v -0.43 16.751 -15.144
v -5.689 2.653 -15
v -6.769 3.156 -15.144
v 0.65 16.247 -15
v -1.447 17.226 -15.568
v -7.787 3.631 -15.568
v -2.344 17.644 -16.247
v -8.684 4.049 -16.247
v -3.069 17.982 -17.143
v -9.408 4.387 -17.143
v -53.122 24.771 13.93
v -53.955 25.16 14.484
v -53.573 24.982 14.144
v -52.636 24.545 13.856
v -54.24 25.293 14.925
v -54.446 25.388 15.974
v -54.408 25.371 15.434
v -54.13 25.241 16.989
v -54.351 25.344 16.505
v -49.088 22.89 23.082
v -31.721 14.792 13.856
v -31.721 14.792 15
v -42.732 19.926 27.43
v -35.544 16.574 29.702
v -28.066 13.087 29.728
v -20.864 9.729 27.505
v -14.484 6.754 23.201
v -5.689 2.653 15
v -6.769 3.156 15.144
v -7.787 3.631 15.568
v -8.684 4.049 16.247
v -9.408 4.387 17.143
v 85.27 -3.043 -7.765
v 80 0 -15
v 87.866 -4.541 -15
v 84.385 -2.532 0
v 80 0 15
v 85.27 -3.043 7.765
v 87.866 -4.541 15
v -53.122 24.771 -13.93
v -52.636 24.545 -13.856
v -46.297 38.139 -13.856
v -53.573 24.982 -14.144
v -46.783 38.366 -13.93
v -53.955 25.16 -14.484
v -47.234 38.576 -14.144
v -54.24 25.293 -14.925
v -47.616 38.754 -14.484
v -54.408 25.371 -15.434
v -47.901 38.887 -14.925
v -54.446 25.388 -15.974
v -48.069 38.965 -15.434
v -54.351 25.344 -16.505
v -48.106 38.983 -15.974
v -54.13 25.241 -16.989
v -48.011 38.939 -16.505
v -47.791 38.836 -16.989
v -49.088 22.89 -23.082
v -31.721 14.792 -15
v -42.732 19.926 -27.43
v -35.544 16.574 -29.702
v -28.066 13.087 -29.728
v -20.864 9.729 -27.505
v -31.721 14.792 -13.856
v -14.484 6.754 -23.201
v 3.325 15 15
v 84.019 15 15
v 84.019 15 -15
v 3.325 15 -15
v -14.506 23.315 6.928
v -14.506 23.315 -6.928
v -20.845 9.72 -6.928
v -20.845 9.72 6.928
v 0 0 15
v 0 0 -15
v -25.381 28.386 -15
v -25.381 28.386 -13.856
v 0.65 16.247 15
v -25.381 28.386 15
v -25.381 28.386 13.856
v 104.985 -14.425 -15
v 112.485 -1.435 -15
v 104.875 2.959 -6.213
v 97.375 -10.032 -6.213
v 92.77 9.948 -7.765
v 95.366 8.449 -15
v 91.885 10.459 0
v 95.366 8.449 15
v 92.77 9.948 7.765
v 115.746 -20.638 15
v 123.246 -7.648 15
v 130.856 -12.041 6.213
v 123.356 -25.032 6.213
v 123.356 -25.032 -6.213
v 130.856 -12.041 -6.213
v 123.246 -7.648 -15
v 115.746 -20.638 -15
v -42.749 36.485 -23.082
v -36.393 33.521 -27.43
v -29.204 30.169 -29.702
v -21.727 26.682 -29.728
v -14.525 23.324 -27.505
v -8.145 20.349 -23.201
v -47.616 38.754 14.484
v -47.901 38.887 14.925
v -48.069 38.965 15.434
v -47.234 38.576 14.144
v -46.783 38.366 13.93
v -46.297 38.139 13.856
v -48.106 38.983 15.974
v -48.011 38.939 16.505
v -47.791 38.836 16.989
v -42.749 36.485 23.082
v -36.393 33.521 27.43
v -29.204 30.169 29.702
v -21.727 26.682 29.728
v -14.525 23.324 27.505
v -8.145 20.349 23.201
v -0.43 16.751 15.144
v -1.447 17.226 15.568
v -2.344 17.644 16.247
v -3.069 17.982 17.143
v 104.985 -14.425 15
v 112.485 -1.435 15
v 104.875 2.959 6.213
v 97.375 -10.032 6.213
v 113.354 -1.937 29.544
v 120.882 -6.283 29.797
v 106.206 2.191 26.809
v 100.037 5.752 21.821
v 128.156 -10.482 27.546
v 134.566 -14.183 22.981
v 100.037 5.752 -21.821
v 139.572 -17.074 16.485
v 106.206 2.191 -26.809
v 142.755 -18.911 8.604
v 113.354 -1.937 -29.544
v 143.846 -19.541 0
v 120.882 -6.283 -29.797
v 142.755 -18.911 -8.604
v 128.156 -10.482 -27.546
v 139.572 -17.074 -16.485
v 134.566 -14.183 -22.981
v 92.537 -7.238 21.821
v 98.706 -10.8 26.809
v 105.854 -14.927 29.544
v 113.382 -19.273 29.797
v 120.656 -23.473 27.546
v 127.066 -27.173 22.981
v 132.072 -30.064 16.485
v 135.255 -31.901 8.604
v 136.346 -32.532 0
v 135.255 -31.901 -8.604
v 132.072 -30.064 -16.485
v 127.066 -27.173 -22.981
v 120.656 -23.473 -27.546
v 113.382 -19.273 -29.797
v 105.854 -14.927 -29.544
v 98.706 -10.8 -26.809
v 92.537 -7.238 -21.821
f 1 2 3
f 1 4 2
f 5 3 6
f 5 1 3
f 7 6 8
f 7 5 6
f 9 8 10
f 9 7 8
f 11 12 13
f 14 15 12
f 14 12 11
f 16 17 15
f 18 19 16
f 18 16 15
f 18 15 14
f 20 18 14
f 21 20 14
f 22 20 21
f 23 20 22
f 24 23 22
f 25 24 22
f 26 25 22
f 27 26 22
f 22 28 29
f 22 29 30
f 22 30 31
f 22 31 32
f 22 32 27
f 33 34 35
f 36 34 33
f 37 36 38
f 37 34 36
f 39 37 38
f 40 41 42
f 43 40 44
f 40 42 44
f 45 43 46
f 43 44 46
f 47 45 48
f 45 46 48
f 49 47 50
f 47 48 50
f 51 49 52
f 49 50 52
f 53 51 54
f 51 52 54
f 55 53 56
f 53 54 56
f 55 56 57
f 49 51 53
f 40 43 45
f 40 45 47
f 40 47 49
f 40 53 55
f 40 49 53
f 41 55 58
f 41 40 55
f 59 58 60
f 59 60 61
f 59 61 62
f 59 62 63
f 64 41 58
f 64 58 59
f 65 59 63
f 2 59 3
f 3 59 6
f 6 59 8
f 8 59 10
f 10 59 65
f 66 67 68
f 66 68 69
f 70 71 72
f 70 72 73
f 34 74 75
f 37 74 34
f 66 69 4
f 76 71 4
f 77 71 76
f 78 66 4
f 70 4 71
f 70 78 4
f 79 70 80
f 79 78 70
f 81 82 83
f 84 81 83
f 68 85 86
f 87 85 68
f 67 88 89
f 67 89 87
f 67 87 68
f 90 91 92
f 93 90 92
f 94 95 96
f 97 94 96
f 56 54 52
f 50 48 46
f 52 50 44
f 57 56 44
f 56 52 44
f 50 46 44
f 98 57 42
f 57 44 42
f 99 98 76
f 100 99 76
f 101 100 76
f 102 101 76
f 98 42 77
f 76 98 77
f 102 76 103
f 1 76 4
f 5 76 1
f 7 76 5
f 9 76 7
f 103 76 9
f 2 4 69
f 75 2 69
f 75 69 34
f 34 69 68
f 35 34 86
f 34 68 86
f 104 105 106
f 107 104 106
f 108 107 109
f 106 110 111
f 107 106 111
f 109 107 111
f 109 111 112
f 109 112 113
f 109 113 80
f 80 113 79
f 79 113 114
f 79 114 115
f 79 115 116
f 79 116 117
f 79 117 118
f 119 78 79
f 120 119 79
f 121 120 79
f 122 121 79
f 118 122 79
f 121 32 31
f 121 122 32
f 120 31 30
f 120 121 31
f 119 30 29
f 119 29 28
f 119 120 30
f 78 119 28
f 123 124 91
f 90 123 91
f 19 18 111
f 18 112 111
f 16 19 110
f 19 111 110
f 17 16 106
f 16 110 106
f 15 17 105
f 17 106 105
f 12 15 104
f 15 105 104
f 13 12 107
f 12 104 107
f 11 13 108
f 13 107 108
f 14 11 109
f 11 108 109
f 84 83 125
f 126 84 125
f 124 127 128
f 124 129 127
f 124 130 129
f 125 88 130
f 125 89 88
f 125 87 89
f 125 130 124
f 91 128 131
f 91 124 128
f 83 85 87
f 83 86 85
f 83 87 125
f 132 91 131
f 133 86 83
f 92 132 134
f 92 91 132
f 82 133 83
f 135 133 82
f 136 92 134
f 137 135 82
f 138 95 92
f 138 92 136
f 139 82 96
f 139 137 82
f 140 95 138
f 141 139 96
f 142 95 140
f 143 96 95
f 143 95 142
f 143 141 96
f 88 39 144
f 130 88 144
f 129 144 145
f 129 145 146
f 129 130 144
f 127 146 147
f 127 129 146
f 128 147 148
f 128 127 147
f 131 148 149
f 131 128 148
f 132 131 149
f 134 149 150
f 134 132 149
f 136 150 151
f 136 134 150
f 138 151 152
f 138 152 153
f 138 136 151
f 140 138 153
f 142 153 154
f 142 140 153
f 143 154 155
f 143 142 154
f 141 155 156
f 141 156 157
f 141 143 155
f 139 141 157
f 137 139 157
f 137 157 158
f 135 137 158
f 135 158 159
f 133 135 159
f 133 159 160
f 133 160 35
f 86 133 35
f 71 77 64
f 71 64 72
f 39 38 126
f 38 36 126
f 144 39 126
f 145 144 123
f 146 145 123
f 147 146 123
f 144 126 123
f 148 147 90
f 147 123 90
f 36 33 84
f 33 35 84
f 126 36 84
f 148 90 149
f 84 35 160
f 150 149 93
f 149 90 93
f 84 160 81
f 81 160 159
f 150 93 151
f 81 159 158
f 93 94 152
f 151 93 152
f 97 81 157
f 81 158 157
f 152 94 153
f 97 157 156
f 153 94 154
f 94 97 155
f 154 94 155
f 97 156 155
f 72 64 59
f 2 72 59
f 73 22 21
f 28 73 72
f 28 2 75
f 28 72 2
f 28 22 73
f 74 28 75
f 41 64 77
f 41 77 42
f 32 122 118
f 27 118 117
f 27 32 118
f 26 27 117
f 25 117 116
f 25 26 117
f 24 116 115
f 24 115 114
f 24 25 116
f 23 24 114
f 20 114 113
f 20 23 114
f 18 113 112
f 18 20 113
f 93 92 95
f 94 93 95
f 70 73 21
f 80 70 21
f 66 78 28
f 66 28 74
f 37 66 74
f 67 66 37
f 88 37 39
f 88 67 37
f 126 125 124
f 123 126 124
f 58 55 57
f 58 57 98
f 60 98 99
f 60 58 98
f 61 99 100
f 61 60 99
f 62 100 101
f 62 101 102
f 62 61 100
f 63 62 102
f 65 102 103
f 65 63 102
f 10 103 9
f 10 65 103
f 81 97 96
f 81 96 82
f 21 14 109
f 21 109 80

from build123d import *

# Parameters (mm, degrees)
EXTRUDE_1_DEPTH          = 15
CUT_EXTRUDE_1_DEPTH      = 109.392019307
CUT_EXTRUDE_1_DEPTH_BACK = 109.392019307
SKETCH_3_R               = 30
SKETCH_3_3_R             = 30
EXTRUDE_2_DEPTH          = 15
EXTRUDE_3_DEPTH          = 15
CUT_EXTRUDE_2_DEPTH      = 153.192153917
CUT_EXTRUDE_2_DEPTH_BACK = 153.192153917
FILLET_1_R               = 5
FILLET_2_R               = 2


with BuildPart() as part:
    # 草图1 → 凸台-拉伸1 (new, symmetric)
    with BuildSketch(Plane.XY):
        Polygon((0, 0), (80, 0), (106.830127019, -15.490381057), (114.330127019, -2.5), (84.019237886, 15), (3.32541994, 15), (-25.38149862, 28.386255966), (-31.720772546, 14.791639161), align=None)
    extrude(amount=EXTRUDE_1_DEPTH, both=True)

    # 草图3 → 切除-拉伸1 (cut, two sides: drawn at the far end of the back side and taken through both)
    with BuildSketch(Plane(origin=(27.5, 47.631397208, 0), x_dir=(0.866025403784438, -0.5000000000000012, 0), z_dir=(0.5000000000000012, 0.866025403784438, 0)).offset(-CUT_EXTRUDE_1_DEPTH_BACK)):
        with Locations((104.345320277, 0)):
            Circle(SKETCH_3_R)
        Polygon((119.345320277, -6.213203436), (119.345320277, 6.213203436), (110.558523712, 15), (98.132116841, 15), (89.345320277, 6.213203436), (89.345320277, -6.213203436), (98.132116841, -15), (110.558523712, -15), align=None, mode=Mode.SUBTRACT)
    extrude(amount=CUT_EXTRUDE_1_DEPTH + CUT_EXTRUDE_1_DEPTH_BACK, mode=Mode.SUBTRACT)


with BuildPart() as body_2:
    # of the pieces the cut leaves, the one that is kept (cut_extrude_1_keep)
    add(part.part.solids().sort_by_distance((0, 0, -15))[0])

    # 草图3<3> → 凸台-拉伸2 (add)
    with BuildSketch(Plane(origin=(27.5, 47.631397208, 0), x_dir=(0.866025403784438, -0.5000000000000012, 0), z_dir=(0.5000000000000012, 0.866025403784438, 0))):
        with Locations((104.345320277, 0)):
            Circle(SKETCH_3_3_R)
        Polygon((119.345320277, -6.213203436), (119.345320277, 6.213203436), (110.558523712, 15), (98.132116841, 15), (89.345320277, 6.213203436), (89.345320277, -6.213203436), (98.132116841, -15), (110.558523712, -15), align=None, mode=Mode.SUBTRACT)
    extrude(amount=-EXTRUDE_2_DEPTH)

    # 草图6 → 凸台-拉伸3 (add)
    with BuildSketch(Plane(origin=(0, 0, 0), x_dir=(0.9063077870366528, -0.4226182617406936, 0), z_dir=(-0.4226182617406936, -0.9063077870366528, 0))):
        with BuildLine():
            Line((-61.608269391, 13.856406461), (-35, 13.856406461))
            Line((-35, 13.856406461), (-35, 15))
            Line((-35, 15), (-9.019237886, 15))
            ThreePointArc((-9.019237886, 15), (-35.652221505, 29.99290928), (-61.608269391, 13.856406461))
        make_face()
        with BuildLine():
            Line((-35, 15), (-35, 13.856406461))
            Line((-35, 13.856406461), (-23, 6.92820323))
            Line((-23, 6.92820323), (-23, -6.92820323))
            Line((-23, -6.92820323), (-35, -13.856406461))
            Line((-35, -13.856406461), (-35, -15))
            Line((-35, -15), (-9.019237886, -15))
            ThreePointArc((-9.019237886, -15), (-5, 0), (-9.019237886, 15))
            Line((-9.019237886, 15), (-35, 15))
        make_face()
        with BuildLine():
            Line((-35, -15), (-35, -13.856406461))
            Line((-35, -13.856406461), (-61.608269391, -13.856406461))
            ThreePointArc((-61.608269391, -13.856406461), (-35.652221505, -29.99290928), (-9.019237886, -15))
            Line((-9.019237886, -15), (-35, -15))
        make_face()
    extrude(amount=-EXTRUDE_3_DEPTH)

    # 草图6<4> → 切除-拉伸2 (cut, two sides: drawn at the far end of the back side and taken through both)
    with BuildSketch(Plane(origin=(0, 0, 0), x_dir=(0.9063077870366528, -0.4226182617406936, 0), z_dir=(-0.4226182617406936, -0.9063077870366528, 0)).offset(-CUT_EXTRUDE_2_DEPTH_BACK)):
        Polygon((-23, 6.92820323), (-35, 13.856406461), (-35, -13.856406461), (-23, -6.92820323), align=None)
    extrude(amount=CUT_EXTRUDE_2_DEPTH + CUT_EXTRUDE_2_DEPTH_BACK, mode=Mode.SUBTRACT)

    # 圆角1
    fillet_1_edges = [body_2.edges().sort_by_distance(p)[0] for p in [
        (-5.004568567, 10.609003041, -15),
        (-5.004568567, 10.609003041, 15),
    ]]
    fillet(fillet_1_edges, radius=FILLET_1_R)

    # 圆角2
    fillet_2_edges = [body_2.edges().sort_by_distance(p)[0] for p in [
        (-52.666417332, 32.834088122, -13.856406461),
        (-52.666417332, 32.834088122, 13.856406461),
    ]]
    fillet(fillet_2_edges, radius=FILLET_2_R)


solid = body_2.part
